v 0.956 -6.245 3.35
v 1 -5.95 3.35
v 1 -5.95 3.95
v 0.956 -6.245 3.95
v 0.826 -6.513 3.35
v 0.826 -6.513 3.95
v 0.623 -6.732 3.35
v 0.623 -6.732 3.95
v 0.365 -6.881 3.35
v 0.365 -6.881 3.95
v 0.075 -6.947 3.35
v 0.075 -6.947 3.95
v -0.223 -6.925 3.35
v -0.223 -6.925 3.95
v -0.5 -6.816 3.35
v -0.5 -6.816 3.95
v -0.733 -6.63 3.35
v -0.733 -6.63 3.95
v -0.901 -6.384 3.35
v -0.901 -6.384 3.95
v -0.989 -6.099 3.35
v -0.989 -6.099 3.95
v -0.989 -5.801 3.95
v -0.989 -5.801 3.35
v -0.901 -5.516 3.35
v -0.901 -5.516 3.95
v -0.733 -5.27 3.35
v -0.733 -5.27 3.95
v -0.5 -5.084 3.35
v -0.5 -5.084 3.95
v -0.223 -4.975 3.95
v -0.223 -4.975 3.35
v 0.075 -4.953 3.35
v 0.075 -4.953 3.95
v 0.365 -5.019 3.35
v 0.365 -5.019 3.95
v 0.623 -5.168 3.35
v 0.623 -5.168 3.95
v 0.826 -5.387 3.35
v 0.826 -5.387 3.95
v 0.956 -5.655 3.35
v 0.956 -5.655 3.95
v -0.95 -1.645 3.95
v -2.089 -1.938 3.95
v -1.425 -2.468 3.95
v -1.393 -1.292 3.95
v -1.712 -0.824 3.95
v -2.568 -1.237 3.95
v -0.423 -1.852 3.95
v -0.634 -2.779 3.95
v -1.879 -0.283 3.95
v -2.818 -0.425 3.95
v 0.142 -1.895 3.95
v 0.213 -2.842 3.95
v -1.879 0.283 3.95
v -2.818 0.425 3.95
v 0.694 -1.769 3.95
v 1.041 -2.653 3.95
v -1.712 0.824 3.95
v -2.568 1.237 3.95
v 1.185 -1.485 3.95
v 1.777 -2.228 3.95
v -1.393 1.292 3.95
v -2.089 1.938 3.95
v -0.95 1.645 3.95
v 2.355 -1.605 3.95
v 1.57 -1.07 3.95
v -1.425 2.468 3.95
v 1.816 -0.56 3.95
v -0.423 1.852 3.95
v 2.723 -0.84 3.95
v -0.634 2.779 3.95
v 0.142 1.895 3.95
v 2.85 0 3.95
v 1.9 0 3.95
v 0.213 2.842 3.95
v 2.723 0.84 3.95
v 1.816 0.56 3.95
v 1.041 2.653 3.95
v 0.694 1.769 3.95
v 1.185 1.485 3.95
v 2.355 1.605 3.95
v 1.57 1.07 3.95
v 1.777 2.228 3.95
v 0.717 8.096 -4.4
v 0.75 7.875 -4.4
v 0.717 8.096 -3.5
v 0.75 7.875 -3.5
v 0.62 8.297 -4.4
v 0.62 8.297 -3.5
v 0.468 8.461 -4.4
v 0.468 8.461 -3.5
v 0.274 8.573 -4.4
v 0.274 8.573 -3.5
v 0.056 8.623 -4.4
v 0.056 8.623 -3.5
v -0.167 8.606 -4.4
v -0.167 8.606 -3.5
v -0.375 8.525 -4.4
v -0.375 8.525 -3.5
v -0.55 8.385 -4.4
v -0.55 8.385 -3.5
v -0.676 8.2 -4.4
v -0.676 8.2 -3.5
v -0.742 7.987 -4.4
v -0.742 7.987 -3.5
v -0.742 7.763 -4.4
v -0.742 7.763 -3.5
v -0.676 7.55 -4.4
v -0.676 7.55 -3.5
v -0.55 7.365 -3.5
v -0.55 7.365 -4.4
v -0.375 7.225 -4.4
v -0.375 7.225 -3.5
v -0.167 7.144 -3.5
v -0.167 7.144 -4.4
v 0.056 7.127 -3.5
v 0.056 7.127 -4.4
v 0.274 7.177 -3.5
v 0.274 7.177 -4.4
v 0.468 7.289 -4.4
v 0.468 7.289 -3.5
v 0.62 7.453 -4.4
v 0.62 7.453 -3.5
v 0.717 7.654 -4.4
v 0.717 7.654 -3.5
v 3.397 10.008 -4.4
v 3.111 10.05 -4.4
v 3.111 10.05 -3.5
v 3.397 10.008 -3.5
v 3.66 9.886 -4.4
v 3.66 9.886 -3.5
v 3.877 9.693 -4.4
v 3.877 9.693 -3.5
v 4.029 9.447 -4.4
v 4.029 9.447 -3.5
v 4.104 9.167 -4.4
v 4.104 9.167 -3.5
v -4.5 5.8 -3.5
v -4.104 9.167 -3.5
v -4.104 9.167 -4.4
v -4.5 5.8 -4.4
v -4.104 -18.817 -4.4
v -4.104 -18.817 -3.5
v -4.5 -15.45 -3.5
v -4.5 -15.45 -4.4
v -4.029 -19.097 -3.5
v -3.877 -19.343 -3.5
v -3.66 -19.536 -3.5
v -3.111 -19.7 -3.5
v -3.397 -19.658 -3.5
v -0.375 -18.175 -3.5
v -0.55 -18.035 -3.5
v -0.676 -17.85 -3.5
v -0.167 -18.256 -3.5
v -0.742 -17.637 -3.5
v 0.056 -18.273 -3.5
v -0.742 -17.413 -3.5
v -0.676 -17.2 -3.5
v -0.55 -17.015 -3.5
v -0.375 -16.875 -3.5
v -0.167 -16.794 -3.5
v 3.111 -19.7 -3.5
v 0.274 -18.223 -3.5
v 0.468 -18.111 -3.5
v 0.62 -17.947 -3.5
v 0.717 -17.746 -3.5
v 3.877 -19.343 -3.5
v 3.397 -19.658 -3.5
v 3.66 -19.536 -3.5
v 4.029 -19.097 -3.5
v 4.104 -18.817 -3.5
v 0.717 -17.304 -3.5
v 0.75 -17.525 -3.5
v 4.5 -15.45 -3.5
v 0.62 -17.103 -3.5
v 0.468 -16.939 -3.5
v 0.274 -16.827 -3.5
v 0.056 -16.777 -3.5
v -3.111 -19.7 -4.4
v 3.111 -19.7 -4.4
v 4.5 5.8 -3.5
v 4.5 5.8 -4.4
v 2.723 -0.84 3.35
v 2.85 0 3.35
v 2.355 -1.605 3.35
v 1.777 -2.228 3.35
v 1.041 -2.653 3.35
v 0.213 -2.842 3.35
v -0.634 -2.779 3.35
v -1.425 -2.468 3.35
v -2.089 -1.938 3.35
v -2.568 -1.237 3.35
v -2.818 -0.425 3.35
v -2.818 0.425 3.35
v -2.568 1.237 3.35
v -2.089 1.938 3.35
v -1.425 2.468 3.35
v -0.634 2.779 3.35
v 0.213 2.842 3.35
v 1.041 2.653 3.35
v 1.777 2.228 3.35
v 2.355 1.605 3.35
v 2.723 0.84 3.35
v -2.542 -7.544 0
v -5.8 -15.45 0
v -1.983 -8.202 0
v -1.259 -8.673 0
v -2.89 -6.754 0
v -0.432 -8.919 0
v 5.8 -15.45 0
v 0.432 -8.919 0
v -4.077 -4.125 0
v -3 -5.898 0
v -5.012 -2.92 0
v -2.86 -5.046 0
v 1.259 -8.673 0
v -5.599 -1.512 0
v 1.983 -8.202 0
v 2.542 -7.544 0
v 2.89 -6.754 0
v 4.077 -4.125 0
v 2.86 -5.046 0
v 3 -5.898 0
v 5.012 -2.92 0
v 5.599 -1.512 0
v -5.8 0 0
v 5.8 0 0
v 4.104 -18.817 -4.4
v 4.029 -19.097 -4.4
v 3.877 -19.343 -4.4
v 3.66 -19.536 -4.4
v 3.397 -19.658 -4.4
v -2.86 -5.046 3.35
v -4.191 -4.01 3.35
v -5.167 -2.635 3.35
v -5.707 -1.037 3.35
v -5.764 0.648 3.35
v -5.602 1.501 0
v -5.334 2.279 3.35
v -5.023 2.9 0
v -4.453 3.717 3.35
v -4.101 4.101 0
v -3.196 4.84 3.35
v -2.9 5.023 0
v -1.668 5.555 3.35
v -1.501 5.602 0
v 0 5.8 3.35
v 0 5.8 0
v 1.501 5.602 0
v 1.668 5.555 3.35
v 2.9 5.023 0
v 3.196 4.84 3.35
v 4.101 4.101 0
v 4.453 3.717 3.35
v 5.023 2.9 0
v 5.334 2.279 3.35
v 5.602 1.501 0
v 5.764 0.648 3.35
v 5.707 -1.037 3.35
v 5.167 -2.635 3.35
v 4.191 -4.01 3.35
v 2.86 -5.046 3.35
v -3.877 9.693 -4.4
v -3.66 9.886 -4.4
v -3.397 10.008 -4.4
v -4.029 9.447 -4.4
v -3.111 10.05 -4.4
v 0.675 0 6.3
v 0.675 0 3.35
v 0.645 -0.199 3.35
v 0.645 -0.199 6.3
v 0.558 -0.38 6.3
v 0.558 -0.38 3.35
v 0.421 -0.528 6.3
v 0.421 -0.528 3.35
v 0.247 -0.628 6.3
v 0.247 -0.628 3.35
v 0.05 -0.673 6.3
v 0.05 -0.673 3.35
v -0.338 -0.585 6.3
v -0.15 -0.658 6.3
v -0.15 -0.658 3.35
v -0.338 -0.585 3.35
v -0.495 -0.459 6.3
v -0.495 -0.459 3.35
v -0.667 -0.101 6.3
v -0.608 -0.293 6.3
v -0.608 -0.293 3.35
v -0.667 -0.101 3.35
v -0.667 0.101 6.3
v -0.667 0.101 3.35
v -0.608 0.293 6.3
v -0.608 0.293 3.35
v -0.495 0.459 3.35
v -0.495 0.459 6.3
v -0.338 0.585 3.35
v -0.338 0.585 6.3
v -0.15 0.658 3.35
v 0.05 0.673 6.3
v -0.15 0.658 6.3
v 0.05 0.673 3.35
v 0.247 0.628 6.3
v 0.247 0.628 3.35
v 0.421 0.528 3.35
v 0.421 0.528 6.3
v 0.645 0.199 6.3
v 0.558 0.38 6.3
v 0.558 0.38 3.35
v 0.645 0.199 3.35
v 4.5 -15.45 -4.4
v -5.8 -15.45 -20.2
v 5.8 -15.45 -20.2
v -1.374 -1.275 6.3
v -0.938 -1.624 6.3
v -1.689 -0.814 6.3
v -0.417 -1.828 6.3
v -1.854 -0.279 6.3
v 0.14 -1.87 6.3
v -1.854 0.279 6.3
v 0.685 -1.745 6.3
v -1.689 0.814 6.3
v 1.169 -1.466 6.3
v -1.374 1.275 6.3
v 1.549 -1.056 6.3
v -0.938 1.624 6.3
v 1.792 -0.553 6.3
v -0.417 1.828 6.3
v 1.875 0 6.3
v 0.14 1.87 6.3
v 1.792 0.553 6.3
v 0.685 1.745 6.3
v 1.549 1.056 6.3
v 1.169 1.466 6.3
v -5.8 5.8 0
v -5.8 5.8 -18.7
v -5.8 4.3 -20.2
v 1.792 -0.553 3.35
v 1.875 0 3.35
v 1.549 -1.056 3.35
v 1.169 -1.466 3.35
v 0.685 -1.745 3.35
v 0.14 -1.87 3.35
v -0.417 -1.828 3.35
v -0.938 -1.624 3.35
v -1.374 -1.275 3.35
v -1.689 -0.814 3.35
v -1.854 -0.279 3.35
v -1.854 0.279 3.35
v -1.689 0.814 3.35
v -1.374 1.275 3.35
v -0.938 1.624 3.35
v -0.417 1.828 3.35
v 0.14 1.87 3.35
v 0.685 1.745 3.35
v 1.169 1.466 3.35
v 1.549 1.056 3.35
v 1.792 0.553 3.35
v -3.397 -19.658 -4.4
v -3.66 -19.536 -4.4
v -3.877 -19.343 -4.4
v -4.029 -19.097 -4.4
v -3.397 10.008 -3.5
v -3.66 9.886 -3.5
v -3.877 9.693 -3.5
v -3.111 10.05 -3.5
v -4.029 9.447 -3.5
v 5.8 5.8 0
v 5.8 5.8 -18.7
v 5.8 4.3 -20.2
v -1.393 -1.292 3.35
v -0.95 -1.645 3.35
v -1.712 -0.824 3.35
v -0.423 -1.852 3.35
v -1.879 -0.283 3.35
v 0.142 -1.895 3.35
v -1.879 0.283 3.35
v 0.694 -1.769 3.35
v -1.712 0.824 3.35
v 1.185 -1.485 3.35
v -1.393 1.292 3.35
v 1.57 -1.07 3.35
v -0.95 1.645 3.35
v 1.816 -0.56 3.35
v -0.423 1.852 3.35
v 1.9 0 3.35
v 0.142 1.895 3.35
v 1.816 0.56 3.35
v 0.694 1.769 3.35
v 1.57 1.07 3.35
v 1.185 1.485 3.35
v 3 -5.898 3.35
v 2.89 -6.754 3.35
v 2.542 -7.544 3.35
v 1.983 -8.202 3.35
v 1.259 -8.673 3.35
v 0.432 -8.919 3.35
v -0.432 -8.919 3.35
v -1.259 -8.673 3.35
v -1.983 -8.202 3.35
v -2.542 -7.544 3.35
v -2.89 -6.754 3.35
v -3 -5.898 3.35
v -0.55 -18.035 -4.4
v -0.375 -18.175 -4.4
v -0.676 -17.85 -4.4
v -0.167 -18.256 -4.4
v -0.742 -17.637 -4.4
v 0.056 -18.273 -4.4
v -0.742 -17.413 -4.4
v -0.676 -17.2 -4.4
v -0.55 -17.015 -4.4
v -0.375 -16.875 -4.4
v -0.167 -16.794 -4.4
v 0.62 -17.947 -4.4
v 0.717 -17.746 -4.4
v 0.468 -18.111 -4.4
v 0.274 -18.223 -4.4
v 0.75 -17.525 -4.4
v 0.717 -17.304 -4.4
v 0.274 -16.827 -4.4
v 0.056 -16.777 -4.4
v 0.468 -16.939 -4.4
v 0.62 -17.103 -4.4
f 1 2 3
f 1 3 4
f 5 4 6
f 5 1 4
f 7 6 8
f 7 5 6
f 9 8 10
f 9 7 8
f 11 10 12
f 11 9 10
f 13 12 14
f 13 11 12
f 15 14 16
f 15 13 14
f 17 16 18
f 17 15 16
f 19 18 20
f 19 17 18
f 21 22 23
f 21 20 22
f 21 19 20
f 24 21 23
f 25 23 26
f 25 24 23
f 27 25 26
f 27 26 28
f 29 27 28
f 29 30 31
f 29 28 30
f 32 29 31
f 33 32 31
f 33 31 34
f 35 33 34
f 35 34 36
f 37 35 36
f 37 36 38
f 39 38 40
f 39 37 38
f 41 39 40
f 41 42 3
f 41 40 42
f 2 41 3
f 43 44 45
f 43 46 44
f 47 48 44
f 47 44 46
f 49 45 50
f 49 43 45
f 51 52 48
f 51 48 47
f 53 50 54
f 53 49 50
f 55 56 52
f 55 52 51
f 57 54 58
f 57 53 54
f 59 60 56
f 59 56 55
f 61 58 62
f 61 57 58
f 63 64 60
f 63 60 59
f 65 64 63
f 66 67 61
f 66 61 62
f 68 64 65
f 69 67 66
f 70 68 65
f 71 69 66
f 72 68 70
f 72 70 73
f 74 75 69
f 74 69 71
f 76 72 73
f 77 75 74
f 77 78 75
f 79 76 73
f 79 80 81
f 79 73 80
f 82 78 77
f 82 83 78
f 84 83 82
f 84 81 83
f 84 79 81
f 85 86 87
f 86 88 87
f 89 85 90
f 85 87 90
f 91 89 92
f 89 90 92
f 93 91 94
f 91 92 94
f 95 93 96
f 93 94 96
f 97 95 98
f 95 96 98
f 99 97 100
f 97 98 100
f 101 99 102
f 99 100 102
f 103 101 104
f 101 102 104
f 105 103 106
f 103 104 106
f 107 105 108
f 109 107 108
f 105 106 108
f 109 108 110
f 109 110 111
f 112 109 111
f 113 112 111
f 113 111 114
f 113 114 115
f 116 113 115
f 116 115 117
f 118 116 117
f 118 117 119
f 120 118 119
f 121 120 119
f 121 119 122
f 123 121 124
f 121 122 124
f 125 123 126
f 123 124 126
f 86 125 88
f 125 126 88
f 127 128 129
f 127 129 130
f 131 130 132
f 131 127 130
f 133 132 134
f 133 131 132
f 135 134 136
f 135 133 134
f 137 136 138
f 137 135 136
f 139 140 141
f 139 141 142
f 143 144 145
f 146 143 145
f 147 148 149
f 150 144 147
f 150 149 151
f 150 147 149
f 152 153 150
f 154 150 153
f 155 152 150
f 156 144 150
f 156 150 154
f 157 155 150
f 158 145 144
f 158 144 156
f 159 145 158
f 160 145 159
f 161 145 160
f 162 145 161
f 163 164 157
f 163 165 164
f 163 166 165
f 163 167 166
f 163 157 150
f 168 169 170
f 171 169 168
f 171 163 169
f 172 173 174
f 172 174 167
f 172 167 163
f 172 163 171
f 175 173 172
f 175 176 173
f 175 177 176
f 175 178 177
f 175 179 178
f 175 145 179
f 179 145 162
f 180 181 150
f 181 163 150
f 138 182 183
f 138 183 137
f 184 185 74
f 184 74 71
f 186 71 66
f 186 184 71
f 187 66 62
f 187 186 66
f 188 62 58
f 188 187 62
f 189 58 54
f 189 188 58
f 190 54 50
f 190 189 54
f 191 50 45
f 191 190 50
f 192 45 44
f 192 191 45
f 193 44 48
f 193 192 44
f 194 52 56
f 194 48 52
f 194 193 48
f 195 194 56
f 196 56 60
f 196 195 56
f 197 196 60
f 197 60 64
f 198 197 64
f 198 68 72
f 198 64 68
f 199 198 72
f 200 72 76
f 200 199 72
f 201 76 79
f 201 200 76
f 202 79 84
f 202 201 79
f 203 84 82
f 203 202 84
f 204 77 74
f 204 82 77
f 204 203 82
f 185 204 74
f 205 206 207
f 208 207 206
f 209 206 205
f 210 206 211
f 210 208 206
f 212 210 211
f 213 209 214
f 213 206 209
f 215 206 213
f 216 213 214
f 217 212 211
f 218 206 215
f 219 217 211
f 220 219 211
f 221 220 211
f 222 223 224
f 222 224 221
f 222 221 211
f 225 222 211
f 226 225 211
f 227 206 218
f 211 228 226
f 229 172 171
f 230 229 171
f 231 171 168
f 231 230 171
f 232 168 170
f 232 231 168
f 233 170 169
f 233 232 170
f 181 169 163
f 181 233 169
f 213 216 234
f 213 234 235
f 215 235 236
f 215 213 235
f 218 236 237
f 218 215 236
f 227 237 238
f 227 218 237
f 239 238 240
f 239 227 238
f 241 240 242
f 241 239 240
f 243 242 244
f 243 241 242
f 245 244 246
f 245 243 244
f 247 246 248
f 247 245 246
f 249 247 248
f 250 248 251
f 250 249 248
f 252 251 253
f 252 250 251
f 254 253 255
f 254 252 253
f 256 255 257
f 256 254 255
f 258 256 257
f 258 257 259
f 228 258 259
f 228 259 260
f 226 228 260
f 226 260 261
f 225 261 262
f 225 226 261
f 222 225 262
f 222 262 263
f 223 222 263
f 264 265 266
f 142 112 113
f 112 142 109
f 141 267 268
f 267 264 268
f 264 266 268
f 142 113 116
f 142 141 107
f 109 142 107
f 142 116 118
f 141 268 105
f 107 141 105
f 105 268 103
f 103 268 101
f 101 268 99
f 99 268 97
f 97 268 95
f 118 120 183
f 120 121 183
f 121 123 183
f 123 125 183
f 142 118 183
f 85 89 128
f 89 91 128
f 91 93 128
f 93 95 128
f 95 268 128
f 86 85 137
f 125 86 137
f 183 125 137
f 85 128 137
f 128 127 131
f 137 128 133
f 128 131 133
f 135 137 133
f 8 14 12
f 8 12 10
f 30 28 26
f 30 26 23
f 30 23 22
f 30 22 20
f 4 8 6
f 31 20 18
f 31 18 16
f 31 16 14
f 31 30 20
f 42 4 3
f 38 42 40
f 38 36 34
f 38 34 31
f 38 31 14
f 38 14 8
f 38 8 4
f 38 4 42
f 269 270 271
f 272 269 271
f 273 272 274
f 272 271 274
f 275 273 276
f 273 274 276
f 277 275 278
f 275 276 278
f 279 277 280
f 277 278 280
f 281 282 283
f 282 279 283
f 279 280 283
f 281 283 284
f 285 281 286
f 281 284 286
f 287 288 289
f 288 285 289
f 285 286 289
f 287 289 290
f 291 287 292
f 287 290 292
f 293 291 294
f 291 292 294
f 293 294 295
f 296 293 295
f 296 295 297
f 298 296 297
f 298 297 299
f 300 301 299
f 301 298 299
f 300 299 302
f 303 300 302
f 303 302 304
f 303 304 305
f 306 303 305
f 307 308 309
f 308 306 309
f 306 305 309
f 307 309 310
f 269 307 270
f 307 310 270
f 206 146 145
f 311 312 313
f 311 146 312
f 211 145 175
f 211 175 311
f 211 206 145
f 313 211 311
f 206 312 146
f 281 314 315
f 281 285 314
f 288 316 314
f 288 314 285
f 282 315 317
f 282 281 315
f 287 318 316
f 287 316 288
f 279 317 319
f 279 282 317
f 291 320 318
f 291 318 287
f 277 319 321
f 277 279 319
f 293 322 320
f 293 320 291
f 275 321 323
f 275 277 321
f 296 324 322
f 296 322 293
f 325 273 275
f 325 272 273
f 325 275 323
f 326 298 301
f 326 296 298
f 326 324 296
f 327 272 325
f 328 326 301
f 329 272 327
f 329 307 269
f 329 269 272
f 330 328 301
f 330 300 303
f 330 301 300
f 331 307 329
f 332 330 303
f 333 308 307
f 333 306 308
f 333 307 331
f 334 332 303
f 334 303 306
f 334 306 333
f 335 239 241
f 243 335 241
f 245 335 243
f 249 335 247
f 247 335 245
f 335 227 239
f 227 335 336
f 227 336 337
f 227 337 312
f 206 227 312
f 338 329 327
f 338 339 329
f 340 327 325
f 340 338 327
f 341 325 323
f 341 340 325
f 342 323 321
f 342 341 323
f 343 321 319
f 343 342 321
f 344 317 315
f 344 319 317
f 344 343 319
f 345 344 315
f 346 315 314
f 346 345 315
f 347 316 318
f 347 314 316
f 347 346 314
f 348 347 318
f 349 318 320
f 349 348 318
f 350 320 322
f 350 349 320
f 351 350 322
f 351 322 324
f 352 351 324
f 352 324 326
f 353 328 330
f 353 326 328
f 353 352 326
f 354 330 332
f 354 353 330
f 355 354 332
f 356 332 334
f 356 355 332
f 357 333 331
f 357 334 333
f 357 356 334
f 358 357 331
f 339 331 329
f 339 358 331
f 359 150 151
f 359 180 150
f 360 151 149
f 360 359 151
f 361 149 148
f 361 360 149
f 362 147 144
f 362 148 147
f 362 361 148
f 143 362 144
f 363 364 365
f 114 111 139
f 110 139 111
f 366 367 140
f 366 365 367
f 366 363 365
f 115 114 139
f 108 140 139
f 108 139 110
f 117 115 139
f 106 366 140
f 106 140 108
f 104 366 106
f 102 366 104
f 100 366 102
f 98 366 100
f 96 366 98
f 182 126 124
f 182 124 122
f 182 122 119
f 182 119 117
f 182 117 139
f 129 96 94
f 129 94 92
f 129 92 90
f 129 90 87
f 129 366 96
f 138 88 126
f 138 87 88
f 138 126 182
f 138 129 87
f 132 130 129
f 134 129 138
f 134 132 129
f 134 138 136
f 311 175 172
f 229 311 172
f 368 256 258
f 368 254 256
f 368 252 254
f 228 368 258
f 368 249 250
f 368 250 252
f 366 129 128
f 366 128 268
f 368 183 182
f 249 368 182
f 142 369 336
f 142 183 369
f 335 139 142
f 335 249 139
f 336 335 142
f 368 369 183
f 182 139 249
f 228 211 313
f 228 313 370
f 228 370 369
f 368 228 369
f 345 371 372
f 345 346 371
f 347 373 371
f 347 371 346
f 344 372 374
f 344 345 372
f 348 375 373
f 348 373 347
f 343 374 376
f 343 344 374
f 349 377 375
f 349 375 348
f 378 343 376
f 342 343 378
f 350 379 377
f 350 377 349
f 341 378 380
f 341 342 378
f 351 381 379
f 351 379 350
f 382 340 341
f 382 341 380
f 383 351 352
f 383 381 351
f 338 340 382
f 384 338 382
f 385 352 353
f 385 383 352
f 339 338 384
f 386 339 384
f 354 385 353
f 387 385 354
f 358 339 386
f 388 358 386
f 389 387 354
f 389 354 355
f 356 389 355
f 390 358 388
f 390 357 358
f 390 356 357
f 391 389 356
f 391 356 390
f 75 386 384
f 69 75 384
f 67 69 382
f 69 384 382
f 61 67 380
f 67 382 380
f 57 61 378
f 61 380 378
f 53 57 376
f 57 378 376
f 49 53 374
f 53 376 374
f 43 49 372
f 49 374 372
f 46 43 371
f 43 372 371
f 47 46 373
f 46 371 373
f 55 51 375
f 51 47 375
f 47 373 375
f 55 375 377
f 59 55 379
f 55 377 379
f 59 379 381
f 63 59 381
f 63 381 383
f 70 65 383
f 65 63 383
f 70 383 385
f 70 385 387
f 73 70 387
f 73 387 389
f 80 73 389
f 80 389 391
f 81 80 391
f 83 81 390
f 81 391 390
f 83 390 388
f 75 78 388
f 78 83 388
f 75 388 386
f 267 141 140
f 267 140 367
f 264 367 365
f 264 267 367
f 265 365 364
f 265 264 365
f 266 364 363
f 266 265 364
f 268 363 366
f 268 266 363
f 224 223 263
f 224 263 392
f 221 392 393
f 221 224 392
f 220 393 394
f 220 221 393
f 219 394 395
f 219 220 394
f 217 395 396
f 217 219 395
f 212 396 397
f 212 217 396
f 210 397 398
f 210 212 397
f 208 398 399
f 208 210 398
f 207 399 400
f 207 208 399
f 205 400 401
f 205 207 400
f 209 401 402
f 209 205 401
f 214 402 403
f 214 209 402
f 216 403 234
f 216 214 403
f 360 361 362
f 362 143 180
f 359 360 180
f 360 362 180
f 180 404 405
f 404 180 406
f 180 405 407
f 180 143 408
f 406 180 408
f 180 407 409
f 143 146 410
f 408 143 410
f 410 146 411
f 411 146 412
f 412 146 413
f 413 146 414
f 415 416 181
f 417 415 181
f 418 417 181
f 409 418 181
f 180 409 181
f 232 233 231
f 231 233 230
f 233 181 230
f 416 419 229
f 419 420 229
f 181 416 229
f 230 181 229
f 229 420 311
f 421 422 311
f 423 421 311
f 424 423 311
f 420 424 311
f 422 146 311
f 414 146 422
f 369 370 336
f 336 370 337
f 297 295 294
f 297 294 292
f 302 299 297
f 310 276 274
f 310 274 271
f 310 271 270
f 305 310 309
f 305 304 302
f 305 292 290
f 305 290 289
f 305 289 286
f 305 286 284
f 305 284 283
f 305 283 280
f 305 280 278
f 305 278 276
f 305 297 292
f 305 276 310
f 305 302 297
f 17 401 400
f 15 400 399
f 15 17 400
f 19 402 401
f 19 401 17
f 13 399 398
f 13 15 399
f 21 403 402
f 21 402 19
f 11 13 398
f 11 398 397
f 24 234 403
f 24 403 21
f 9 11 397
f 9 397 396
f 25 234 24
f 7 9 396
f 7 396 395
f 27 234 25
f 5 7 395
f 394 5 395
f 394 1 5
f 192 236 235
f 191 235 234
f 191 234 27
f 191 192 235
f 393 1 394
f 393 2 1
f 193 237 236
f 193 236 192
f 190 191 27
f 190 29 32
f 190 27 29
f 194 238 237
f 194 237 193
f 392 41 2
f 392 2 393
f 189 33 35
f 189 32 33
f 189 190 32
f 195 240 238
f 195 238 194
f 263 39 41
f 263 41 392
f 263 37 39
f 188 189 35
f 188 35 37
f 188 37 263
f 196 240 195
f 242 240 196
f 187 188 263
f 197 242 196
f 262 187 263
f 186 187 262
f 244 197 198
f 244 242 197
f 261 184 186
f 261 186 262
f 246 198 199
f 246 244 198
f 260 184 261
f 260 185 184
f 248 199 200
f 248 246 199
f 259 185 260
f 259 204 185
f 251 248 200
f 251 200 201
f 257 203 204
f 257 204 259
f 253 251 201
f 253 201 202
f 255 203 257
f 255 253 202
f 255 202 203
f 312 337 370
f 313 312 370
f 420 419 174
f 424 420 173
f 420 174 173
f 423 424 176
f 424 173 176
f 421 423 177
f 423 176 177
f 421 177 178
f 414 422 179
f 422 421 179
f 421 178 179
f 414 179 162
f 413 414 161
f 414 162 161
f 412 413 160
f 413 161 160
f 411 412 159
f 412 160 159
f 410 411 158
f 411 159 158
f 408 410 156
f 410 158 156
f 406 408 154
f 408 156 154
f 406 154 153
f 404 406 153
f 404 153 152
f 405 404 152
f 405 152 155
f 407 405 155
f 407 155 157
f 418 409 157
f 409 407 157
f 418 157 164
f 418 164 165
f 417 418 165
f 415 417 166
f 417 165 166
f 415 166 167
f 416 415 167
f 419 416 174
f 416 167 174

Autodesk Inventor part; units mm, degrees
ref_plane "YZ Plane" through (0, 0, 0) normal (1, 0, 0) x (0, 1, 0)
ref_plane "XZ Plane" through (0, 0, 0) normal (0, 1, 0) x (-1, 0, 0)
sketch "Sketch1" plane through (0, 0, 0) normal (0, 0, 1) x (1, 0, 0)
  line L0 (-8.12, 0) -> (8.12, 0) projected
  line L1 (0, -19.7) -> (0, 10.05) projected
  circle A0 centre (0, 0) radius 5.8
  line L2 (-5.8, -15.45) -> (5.8, -15.45)
  line L3 (5.8, -15.45) -> (5.8, 5.8)
  line L4 (5.8, 5.8) -> (-5.8, 5.8)
  line L5 (-5.8, 5.8) -> (-5.8, -15.45)
  line L6 (-5.8, -15.45) -> (5.8, 5.8) construction
  line L7 (5.8, -15.45) -> (-5.8, 5.8) construction
  circle A1 centre (0, -5.95) radius 3
  point P0 (0, -4.825)
  point P1 (0, -8.95)
  dimension "d4" = 6
  dimension "d0" = 21.25
  dimension "d1" = 11.6
  dimension "d5" = 6.5
extrude "Extrusion1" add sketch "Sketch1" against normal blind 20.2
extrude "Extrusion2" add sketch "Sketch1" along normal blind 3.35 contours A0 L1 L0 | L0 L1 A1 A0 | L1 A0 L0 | L0 A0 A1 L1 | A1 L1 A0 | A0 L1 A1 | A1 A0 L1 | A0 A1 L1
sketch "Sketch2" plane through (0, 0, 3.35) normal (0, 0, 1) x (1, 0, 0)
  arc A0 (2.8604, -5.0456) -> (-2.8604, -5.0456) centre (0, 0) ccw projected
  arc A1 (-2.8604, -5.0456) -> (2.8604, -5.0456) centre (0, -5.95) ccw projected
  circle A2 centre (0, -5.95) radius 1
  circle A3 centre (0, 0) radius 2.85
  circle A4 centre (0, 0) radius 1.9
  circle A5 centre (0, 0) radius 1.875
  circle A6 centre (0, 0) radius 0.675
  dimension "d9" = 5.7
  dimension "d10" = 2
  dimension "d11" = 3.8
  dimension "d14" = 3.75
  dimension "d17" = 1.35
extrude "Extrusion3" add sketch "Sketch2" along normal blind 0.6 contours A2 | A3
extrude "Extrusion4" add sketch "Sketch2" along normal blind 2.95 contours A5
ref_plane "Work Plane1" through (0, 0, -3.5) normal (0, 0, 1) x (1, 0, 0)
sketch "Sketch3" plane through (0, 0, -3.5) normal (0, 0, 1) x (1, 0, 0)
  line L0 (5.8, 5.8) -> (0, 5.8) projected
  line L1 (-5.8, 5.8) -> (5.8, 5.8) projected
  line L2 (0, 5.8) -> (-5.8, 5.8) projected
  line L3 (-5.8, -15.45) -> (5.8, -15.45) projected
  line L4 (5.8, -15.45) -> (-5.8, -15.45) projected
  line L5 (0, -19.7) -> (0, 10.05) projected
  line L6 (-5.8, 5.8) -> (-5.8, 0) projected
  line L7 (-5.8, -15.45) -> (-5.8, 5.8) projected
  line L8 (-5.8, 0) -> (-5.8, -15.45) projected
  line L9 (5.8, -15.45) -> (5.8, 0) projected
  line L10 (5.8, 5.8) -> (5.8, -15.45) projected
  line L11 (5.8, 0) -> (5.8, 5.8) projected
  line L12 (5.8, -4.825) -> (-5.8, -4.825)
  line L13 (-4.5, 5.8) -> (4.5, 5.8)
  line L14 (4.5, 5.8) -> (4, 10.05)
  line L15 (4, 10.05) -> (-4, 10.05)
  line L16 (-4, 10.05) -> (-4.5, 5.8)
  circle A0 centre (0, 7.875) radius 0.75
  line L17 (-4.5, -15.45) -> (4.5, -15.45)
  line L18 (4.5, -15.45) -> (4, -19.7)
  line L19 (4, -19.7) -> (-4, -19.7)
  line L20 (-4, -19.7) -> (-4.5, -15.45)
  circle A1 centre (0, -17.525) radius 0.75
  point P0 (0, 0)
  dimension "d19" = 1.5
  dimension "d20" = 9
  dimension "d21" = 8
  dimension "d22" = 4.25
  dimension "d23" = 25.4
extrude "Extrusion5" add sketch "Sketch3" against normal blind 0.9 contours L0 L5 A0 L15 L14 | L1 L16 L15 L5 A0 | L5 A1 L19 L20 L3 | L3 L18 L19 L5 A1
fillet "Fillet1" radius 1 4 edges at (4, -19.7, -3.95) (-4, -19.7, -3.95) (4, 10.05, -3.95) (-4, 10.05, -3.95)
chamfer "Chamfer1" distance 1.5 angle 45 1 edges at (0, 5.8, -20.2)
sketch "Sketch4" plane through (0, 0, -4.4) normal (0, 0, -1) x (-1, 0, 0)
  arc A0 (4.1039, 9.1668) -> (3.1108, 10.05) centre (3.1108, 9.05) ccw projected
  line L0 (3.1108, 10.05) -> (-3.1108, 10.05) projected
  arc A1 (-3.1108, 10.05) -> (-4.1039, 9.1668) centre (-3.1108, 9.05) ccw projected
  line L1 (-4.1039, 9.1668) -> (-4.5, 5.8) projected
  line L2 (4.5, 5.8) -> (-4.5, 5.8) projected
  line L3 (4.5, 5.8) -> (4.1039, 9.1668) projected
  circle A2 centre (0, 7.875) radius 0.75 projected
  point P0 (0, 0)
extrude "BREAK_DA_TAB" [suppressed]
properties part number "empty"
